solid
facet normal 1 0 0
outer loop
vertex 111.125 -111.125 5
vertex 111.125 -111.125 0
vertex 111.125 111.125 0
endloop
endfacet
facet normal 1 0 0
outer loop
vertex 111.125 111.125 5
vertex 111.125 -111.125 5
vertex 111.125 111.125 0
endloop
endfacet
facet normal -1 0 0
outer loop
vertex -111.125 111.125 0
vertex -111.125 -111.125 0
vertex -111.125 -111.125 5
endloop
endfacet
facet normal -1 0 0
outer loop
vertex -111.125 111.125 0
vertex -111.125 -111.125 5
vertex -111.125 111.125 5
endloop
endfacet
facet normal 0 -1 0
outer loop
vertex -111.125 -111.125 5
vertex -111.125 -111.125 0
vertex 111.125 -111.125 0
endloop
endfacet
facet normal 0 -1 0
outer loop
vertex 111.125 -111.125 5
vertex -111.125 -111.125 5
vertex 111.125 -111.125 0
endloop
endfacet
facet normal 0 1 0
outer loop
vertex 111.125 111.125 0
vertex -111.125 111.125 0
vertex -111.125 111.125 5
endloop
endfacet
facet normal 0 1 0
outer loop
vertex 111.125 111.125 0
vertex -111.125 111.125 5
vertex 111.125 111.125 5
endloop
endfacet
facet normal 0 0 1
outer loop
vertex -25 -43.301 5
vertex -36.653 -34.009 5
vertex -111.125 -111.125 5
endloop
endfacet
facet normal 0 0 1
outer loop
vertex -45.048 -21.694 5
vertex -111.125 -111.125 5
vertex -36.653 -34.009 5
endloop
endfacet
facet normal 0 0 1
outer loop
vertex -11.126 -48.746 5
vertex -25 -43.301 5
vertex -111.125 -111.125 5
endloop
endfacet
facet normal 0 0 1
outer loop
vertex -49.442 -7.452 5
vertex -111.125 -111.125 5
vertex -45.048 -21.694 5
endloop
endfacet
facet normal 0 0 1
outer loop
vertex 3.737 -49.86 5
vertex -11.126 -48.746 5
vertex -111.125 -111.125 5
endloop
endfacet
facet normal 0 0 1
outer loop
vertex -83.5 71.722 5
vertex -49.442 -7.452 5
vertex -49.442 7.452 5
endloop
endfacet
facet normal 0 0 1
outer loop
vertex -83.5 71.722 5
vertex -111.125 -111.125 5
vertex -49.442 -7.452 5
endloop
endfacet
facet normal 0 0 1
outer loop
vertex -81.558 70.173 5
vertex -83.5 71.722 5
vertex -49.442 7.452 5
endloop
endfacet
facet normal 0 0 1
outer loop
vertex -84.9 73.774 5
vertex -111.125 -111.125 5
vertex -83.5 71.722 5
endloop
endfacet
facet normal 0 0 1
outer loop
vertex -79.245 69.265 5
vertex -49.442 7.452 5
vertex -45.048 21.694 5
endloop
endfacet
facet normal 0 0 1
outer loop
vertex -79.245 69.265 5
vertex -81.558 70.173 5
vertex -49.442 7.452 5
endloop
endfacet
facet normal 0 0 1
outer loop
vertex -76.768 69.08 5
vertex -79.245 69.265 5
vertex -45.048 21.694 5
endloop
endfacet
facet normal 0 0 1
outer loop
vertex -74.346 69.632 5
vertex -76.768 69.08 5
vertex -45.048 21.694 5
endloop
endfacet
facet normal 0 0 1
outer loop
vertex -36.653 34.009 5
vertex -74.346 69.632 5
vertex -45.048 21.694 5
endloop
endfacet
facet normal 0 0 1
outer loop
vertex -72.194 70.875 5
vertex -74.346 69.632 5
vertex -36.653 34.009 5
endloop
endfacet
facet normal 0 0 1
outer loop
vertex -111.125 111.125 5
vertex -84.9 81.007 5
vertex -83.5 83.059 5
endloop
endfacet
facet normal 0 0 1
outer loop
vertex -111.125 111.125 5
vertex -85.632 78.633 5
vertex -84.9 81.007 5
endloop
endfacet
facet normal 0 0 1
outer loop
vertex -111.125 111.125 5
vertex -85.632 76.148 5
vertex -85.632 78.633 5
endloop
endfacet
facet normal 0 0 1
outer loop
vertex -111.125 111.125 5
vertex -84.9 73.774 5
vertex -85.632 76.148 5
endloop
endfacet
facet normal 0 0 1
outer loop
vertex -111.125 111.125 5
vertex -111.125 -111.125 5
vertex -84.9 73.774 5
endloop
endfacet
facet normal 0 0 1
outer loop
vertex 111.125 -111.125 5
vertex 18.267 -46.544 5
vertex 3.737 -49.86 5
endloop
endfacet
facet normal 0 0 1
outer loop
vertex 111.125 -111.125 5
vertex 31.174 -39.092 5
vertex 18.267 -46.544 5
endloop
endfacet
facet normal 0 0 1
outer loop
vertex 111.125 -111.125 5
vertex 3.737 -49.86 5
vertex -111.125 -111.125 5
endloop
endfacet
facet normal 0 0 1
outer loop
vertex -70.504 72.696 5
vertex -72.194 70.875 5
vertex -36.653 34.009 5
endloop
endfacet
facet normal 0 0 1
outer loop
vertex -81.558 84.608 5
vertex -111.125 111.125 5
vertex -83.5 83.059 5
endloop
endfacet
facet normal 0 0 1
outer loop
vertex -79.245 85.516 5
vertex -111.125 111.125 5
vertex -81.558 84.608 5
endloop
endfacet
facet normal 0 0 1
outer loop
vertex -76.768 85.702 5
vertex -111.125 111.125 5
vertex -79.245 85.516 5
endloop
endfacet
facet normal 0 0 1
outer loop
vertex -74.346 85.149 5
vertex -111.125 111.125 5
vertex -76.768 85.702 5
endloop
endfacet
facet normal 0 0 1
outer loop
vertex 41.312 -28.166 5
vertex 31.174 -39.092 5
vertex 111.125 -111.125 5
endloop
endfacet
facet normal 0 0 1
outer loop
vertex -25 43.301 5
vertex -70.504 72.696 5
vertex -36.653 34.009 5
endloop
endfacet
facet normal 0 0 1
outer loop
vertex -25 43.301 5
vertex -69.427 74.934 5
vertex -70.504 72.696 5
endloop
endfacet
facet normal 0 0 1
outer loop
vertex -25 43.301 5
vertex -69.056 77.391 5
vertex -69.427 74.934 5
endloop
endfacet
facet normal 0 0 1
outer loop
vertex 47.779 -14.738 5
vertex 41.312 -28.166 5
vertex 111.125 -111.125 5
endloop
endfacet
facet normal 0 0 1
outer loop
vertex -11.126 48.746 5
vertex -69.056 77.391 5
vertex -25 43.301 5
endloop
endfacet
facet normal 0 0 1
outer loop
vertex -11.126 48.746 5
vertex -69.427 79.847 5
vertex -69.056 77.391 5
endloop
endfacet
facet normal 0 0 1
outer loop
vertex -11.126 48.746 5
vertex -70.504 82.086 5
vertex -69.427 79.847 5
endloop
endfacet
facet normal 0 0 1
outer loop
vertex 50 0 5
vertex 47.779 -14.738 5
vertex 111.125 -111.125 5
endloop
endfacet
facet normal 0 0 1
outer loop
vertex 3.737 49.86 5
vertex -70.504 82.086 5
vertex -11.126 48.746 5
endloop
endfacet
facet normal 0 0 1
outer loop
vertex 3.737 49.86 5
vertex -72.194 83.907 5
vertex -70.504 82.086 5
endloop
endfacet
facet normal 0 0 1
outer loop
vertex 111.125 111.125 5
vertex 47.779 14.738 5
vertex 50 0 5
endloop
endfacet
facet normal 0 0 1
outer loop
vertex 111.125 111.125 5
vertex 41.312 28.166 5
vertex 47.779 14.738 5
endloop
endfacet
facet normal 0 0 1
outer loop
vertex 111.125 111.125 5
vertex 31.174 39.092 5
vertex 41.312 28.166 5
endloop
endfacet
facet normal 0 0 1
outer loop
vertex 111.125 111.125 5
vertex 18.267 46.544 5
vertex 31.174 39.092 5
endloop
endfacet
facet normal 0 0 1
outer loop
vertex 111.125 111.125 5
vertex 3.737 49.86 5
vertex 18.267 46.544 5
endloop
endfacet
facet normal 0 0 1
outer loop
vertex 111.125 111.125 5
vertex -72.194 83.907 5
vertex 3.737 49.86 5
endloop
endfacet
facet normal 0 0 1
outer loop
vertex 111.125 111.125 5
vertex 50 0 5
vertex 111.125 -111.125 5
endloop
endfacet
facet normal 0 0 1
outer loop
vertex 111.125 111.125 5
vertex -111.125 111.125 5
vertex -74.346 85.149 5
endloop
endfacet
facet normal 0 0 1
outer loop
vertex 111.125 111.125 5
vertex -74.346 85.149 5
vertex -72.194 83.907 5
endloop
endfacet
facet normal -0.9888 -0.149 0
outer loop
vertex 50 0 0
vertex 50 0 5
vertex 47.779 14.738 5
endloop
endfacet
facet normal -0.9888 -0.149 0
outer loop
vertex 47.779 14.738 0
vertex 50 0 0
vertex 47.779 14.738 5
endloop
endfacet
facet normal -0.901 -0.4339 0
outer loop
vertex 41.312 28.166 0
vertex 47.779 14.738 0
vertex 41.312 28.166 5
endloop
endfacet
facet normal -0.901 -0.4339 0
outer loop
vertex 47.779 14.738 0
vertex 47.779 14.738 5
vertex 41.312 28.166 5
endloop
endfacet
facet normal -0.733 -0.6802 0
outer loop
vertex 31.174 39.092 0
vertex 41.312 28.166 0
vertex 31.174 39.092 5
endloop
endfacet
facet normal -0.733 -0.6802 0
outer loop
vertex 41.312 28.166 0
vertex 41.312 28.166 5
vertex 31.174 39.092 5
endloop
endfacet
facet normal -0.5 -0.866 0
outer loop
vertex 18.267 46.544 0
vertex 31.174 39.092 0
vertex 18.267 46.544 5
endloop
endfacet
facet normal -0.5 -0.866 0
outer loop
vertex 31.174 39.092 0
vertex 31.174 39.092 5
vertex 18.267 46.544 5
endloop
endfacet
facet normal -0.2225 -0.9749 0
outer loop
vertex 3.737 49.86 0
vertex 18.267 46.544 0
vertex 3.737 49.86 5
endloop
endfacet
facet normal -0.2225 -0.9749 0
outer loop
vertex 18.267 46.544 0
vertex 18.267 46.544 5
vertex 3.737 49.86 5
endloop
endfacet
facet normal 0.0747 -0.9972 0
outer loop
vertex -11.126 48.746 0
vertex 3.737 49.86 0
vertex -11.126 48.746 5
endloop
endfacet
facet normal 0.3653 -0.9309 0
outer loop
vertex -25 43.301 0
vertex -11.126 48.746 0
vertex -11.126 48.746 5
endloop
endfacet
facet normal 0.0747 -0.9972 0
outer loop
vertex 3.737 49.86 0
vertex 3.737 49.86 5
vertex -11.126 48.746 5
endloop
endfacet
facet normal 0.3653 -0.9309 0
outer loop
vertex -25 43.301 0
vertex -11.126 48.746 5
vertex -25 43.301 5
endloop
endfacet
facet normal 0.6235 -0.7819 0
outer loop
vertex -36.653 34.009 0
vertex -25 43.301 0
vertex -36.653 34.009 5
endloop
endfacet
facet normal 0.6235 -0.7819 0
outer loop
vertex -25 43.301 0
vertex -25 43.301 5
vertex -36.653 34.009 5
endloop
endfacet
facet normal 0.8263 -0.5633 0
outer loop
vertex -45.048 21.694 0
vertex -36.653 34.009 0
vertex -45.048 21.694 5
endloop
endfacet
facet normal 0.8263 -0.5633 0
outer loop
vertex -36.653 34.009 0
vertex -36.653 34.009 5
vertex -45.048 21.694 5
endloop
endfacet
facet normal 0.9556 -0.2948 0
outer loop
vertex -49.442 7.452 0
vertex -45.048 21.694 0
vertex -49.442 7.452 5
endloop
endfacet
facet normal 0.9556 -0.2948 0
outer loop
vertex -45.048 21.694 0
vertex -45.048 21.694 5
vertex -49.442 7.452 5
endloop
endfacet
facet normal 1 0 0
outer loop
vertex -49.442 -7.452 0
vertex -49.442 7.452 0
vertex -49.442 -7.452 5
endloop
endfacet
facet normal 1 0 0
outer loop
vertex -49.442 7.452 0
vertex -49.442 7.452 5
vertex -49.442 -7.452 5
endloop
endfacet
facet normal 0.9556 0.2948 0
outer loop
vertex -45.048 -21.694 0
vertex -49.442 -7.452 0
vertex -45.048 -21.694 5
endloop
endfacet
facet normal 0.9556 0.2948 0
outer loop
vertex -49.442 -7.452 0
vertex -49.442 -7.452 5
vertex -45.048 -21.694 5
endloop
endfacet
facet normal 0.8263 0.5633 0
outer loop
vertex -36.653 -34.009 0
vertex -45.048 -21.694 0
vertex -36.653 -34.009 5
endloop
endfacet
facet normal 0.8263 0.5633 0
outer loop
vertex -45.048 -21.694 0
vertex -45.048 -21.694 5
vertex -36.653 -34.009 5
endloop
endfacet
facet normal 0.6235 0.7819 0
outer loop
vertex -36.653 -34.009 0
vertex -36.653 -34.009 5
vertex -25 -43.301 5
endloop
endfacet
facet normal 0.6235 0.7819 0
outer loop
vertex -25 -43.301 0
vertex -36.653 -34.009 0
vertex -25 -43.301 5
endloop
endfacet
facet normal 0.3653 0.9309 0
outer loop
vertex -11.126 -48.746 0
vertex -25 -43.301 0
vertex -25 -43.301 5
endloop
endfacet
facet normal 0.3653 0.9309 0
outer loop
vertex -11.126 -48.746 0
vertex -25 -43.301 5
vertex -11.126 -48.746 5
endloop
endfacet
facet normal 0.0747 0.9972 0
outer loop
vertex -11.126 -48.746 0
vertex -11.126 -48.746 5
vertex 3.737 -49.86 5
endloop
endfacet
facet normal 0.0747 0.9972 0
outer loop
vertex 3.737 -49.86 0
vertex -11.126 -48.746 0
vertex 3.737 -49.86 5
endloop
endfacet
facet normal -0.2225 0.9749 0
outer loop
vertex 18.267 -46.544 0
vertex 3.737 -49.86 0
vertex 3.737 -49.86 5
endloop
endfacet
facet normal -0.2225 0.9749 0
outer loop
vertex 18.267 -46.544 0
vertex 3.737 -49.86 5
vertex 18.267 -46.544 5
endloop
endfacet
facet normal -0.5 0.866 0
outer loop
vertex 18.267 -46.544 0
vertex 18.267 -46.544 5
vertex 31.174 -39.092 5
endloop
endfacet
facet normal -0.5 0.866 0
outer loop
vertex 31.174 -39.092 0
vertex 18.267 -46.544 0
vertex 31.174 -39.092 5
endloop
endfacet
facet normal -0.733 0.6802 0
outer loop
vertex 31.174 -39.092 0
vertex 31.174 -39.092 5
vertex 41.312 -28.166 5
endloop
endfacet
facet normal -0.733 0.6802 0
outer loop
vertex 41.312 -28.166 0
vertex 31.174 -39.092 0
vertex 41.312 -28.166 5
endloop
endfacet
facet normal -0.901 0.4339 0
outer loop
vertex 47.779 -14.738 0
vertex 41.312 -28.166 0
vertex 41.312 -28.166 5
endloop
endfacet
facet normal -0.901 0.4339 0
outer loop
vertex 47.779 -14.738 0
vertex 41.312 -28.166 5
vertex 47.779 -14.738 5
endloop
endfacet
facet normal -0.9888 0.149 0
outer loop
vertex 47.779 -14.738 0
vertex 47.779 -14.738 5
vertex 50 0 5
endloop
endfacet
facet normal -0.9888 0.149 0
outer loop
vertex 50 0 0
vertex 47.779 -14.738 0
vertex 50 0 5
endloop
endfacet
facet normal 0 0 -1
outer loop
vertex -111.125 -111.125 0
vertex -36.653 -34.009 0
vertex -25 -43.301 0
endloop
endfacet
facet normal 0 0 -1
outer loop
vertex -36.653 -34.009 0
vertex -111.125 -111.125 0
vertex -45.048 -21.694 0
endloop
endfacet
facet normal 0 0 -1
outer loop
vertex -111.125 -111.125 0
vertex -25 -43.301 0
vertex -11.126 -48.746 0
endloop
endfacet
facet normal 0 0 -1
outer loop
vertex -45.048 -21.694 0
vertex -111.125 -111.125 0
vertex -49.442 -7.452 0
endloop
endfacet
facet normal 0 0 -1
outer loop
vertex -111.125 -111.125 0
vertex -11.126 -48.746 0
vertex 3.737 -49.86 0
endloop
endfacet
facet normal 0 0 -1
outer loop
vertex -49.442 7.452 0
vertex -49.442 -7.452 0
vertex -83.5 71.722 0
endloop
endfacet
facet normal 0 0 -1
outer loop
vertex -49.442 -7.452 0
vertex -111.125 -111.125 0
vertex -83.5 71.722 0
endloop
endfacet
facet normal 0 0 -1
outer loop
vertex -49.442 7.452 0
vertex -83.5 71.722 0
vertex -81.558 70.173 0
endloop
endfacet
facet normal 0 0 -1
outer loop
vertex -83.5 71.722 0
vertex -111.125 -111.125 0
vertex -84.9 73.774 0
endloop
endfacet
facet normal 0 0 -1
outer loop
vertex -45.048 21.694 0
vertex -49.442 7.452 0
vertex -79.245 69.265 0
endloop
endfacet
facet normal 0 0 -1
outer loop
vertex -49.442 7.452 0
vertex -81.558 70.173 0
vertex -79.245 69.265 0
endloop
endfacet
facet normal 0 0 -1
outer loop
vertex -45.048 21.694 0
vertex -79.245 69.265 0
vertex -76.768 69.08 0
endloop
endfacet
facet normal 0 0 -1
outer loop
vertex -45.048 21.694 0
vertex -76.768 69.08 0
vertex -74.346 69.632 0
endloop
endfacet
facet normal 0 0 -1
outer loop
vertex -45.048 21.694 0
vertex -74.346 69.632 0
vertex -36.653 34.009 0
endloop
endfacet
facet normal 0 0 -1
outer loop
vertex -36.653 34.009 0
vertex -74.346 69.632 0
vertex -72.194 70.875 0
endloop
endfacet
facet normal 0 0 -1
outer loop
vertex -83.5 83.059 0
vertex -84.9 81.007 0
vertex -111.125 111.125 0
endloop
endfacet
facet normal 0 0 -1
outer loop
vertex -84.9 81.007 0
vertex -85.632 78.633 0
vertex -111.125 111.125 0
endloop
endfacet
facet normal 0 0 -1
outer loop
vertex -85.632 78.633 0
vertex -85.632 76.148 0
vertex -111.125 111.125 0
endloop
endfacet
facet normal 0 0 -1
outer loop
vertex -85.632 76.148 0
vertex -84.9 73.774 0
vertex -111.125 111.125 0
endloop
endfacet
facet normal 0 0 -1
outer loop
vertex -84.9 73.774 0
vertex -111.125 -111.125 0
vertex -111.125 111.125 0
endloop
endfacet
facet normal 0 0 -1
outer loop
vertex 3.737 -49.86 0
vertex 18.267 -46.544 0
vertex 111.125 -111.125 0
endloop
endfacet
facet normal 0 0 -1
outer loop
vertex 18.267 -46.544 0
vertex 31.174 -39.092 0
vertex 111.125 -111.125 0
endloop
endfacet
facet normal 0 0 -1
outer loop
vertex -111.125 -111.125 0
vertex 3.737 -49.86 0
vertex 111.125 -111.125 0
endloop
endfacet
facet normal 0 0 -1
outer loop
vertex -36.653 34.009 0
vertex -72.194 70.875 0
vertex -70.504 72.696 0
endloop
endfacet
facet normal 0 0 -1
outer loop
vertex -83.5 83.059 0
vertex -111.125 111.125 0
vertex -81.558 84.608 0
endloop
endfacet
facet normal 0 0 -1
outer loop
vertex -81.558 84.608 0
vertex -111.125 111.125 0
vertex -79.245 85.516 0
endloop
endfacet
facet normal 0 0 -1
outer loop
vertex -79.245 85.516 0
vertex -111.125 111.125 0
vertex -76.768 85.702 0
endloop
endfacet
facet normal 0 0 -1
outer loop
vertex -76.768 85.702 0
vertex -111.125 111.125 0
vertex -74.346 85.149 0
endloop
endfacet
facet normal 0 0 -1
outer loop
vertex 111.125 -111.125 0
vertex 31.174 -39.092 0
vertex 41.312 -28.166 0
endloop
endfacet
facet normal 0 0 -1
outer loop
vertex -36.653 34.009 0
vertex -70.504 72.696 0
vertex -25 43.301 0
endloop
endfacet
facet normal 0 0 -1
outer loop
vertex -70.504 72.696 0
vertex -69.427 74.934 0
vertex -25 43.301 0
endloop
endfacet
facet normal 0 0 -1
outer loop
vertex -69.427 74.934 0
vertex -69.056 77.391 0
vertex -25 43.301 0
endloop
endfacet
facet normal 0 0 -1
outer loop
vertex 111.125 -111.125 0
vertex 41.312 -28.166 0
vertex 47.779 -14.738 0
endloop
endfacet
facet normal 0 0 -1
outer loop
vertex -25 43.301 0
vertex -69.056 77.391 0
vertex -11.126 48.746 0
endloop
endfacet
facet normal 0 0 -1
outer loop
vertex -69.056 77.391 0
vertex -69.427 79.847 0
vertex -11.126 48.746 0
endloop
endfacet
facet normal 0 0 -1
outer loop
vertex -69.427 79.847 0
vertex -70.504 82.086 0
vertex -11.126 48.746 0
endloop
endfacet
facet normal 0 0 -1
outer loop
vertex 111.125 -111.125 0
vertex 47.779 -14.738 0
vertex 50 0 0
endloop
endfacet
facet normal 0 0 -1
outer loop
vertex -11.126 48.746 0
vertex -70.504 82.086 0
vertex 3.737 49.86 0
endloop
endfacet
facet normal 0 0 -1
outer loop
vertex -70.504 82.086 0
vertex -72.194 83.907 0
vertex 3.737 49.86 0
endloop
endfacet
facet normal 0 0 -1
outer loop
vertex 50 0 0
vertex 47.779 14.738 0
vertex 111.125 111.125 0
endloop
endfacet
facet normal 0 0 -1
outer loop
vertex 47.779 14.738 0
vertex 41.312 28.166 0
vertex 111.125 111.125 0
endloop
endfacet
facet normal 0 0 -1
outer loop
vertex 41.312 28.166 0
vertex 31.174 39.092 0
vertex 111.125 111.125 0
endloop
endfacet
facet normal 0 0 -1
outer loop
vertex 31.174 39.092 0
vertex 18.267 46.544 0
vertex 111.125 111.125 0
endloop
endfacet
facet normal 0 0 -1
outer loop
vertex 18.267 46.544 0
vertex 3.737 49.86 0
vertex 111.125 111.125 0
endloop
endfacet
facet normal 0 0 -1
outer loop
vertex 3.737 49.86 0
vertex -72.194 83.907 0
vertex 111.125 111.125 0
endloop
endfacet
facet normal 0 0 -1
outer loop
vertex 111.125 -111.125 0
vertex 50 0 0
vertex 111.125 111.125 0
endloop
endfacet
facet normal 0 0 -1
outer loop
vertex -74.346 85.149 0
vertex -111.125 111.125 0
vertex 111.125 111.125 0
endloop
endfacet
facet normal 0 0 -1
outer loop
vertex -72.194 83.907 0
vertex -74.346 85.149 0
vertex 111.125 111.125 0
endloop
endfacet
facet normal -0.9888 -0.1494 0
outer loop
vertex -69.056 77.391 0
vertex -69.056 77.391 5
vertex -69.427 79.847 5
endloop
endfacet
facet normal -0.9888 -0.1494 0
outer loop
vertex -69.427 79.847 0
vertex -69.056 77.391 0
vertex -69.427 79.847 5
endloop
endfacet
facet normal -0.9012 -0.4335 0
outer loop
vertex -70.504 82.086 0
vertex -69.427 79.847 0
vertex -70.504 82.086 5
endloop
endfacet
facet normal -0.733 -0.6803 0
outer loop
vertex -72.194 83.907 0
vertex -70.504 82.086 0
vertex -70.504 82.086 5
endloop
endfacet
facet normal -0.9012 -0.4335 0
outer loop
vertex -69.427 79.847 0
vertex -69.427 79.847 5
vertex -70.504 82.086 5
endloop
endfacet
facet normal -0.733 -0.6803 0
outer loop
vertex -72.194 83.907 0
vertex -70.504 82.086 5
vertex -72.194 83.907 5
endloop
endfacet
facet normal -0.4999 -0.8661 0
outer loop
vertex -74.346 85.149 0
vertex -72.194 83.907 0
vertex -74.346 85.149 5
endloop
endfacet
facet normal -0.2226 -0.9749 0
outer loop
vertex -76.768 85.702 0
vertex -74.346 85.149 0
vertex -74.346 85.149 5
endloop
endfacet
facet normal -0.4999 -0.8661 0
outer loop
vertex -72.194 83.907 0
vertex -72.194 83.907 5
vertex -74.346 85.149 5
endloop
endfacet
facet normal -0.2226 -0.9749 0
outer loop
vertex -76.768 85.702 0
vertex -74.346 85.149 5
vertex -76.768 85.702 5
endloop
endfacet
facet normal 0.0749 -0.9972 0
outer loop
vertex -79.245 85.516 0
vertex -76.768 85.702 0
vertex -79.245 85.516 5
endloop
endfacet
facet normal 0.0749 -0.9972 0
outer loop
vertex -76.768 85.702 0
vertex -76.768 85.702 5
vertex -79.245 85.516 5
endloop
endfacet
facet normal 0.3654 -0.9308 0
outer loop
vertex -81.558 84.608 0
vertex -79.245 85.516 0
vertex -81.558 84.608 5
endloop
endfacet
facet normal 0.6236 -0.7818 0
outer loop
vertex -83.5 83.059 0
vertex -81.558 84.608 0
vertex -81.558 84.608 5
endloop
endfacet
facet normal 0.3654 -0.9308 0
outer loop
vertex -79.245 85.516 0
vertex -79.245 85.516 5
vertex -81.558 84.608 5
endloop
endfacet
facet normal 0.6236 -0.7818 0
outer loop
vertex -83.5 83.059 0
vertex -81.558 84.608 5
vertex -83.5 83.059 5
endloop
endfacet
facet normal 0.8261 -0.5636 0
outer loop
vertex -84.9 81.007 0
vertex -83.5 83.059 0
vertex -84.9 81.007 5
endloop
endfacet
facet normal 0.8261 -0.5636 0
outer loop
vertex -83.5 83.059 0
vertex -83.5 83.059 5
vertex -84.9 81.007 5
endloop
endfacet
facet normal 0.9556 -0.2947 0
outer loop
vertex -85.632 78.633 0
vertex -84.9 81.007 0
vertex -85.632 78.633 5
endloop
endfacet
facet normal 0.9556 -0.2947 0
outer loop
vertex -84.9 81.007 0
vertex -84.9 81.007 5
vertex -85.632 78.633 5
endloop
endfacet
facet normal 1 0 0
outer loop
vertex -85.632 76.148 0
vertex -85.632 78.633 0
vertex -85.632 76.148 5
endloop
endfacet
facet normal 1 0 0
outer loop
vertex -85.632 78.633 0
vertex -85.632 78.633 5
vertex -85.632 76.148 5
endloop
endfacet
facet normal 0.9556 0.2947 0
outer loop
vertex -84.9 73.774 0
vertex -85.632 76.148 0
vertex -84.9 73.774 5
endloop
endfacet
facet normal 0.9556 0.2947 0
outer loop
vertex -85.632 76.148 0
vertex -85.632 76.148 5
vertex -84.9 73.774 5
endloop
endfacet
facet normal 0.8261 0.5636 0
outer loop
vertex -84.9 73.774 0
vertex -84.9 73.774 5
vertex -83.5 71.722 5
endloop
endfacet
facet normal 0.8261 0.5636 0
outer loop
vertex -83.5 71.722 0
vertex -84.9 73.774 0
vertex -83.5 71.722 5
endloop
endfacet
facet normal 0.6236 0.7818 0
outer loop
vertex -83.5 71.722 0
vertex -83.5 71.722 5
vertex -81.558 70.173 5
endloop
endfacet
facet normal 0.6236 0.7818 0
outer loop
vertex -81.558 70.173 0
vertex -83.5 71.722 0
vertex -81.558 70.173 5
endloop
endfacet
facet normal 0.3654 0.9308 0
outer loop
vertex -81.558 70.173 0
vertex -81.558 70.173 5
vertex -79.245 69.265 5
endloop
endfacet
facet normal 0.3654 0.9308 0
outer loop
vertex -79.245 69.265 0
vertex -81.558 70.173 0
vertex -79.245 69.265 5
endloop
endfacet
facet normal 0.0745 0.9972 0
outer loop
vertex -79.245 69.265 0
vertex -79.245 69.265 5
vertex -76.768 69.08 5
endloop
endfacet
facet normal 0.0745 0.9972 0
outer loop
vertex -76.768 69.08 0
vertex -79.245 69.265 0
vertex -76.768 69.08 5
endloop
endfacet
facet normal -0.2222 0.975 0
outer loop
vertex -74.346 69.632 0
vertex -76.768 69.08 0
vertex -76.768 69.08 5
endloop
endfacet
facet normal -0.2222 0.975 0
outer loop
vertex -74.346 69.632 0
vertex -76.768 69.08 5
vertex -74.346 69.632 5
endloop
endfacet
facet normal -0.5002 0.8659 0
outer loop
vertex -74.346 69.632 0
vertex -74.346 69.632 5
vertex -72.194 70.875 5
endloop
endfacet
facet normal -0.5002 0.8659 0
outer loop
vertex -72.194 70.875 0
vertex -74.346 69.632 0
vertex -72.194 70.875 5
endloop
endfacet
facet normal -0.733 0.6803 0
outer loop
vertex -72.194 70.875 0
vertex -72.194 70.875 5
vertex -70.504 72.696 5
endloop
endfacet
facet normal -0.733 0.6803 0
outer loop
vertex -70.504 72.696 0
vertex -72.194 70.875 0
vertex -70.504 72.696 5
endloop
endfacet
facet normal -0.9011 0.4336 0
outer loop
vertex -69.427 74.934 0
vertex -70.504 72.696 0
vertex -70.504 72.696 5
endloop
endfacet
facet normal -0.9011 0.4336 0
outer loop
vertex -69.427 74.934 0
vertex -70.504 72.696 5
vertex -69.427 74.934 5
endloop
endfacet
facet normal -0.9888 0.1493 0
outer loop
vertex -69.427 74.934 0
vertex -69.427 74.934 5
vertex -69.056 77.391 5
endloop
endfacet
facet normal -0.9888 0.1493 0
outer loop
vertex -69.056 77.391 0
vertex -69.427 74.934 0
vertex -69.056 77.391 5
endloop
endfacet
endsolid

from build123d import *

# Parameters (mm, degrees)
F0_W     = 222.25
F0_H     = 222.25
F1_DEPTH = 5
F2_R     = 50
F3_DEPTH = 5.001
F4_R     = 8.334375
F5_DEPTH = 5.001


with BuildPart() as f1:
    # F0 (on Top) → F1 (new body)
    with BuildSketch(Plane.XY):
        Rectangle(F0_W, F0_H)
    extrude(amount=F1_DEPTH)

    # F2 (on face) → F3 (cut, through all)
    with BuildSketch(Plane.XY.offset(5)):
        Circle(F2_R)
    extrude(amount=-F3_DEPTH, mode=Mode.SUBTRACT)

    # F4 (on face) → F5 (cut, through all)
    with BuildSketch(Plane.XY.offset(5)):
        with Locations((-77.390625, 77.390625)):
            Circle(F4_R)
    extrude(amount=-F5_DEPTH, mode=Mode.SUBTRACT)


solid = f1.part
